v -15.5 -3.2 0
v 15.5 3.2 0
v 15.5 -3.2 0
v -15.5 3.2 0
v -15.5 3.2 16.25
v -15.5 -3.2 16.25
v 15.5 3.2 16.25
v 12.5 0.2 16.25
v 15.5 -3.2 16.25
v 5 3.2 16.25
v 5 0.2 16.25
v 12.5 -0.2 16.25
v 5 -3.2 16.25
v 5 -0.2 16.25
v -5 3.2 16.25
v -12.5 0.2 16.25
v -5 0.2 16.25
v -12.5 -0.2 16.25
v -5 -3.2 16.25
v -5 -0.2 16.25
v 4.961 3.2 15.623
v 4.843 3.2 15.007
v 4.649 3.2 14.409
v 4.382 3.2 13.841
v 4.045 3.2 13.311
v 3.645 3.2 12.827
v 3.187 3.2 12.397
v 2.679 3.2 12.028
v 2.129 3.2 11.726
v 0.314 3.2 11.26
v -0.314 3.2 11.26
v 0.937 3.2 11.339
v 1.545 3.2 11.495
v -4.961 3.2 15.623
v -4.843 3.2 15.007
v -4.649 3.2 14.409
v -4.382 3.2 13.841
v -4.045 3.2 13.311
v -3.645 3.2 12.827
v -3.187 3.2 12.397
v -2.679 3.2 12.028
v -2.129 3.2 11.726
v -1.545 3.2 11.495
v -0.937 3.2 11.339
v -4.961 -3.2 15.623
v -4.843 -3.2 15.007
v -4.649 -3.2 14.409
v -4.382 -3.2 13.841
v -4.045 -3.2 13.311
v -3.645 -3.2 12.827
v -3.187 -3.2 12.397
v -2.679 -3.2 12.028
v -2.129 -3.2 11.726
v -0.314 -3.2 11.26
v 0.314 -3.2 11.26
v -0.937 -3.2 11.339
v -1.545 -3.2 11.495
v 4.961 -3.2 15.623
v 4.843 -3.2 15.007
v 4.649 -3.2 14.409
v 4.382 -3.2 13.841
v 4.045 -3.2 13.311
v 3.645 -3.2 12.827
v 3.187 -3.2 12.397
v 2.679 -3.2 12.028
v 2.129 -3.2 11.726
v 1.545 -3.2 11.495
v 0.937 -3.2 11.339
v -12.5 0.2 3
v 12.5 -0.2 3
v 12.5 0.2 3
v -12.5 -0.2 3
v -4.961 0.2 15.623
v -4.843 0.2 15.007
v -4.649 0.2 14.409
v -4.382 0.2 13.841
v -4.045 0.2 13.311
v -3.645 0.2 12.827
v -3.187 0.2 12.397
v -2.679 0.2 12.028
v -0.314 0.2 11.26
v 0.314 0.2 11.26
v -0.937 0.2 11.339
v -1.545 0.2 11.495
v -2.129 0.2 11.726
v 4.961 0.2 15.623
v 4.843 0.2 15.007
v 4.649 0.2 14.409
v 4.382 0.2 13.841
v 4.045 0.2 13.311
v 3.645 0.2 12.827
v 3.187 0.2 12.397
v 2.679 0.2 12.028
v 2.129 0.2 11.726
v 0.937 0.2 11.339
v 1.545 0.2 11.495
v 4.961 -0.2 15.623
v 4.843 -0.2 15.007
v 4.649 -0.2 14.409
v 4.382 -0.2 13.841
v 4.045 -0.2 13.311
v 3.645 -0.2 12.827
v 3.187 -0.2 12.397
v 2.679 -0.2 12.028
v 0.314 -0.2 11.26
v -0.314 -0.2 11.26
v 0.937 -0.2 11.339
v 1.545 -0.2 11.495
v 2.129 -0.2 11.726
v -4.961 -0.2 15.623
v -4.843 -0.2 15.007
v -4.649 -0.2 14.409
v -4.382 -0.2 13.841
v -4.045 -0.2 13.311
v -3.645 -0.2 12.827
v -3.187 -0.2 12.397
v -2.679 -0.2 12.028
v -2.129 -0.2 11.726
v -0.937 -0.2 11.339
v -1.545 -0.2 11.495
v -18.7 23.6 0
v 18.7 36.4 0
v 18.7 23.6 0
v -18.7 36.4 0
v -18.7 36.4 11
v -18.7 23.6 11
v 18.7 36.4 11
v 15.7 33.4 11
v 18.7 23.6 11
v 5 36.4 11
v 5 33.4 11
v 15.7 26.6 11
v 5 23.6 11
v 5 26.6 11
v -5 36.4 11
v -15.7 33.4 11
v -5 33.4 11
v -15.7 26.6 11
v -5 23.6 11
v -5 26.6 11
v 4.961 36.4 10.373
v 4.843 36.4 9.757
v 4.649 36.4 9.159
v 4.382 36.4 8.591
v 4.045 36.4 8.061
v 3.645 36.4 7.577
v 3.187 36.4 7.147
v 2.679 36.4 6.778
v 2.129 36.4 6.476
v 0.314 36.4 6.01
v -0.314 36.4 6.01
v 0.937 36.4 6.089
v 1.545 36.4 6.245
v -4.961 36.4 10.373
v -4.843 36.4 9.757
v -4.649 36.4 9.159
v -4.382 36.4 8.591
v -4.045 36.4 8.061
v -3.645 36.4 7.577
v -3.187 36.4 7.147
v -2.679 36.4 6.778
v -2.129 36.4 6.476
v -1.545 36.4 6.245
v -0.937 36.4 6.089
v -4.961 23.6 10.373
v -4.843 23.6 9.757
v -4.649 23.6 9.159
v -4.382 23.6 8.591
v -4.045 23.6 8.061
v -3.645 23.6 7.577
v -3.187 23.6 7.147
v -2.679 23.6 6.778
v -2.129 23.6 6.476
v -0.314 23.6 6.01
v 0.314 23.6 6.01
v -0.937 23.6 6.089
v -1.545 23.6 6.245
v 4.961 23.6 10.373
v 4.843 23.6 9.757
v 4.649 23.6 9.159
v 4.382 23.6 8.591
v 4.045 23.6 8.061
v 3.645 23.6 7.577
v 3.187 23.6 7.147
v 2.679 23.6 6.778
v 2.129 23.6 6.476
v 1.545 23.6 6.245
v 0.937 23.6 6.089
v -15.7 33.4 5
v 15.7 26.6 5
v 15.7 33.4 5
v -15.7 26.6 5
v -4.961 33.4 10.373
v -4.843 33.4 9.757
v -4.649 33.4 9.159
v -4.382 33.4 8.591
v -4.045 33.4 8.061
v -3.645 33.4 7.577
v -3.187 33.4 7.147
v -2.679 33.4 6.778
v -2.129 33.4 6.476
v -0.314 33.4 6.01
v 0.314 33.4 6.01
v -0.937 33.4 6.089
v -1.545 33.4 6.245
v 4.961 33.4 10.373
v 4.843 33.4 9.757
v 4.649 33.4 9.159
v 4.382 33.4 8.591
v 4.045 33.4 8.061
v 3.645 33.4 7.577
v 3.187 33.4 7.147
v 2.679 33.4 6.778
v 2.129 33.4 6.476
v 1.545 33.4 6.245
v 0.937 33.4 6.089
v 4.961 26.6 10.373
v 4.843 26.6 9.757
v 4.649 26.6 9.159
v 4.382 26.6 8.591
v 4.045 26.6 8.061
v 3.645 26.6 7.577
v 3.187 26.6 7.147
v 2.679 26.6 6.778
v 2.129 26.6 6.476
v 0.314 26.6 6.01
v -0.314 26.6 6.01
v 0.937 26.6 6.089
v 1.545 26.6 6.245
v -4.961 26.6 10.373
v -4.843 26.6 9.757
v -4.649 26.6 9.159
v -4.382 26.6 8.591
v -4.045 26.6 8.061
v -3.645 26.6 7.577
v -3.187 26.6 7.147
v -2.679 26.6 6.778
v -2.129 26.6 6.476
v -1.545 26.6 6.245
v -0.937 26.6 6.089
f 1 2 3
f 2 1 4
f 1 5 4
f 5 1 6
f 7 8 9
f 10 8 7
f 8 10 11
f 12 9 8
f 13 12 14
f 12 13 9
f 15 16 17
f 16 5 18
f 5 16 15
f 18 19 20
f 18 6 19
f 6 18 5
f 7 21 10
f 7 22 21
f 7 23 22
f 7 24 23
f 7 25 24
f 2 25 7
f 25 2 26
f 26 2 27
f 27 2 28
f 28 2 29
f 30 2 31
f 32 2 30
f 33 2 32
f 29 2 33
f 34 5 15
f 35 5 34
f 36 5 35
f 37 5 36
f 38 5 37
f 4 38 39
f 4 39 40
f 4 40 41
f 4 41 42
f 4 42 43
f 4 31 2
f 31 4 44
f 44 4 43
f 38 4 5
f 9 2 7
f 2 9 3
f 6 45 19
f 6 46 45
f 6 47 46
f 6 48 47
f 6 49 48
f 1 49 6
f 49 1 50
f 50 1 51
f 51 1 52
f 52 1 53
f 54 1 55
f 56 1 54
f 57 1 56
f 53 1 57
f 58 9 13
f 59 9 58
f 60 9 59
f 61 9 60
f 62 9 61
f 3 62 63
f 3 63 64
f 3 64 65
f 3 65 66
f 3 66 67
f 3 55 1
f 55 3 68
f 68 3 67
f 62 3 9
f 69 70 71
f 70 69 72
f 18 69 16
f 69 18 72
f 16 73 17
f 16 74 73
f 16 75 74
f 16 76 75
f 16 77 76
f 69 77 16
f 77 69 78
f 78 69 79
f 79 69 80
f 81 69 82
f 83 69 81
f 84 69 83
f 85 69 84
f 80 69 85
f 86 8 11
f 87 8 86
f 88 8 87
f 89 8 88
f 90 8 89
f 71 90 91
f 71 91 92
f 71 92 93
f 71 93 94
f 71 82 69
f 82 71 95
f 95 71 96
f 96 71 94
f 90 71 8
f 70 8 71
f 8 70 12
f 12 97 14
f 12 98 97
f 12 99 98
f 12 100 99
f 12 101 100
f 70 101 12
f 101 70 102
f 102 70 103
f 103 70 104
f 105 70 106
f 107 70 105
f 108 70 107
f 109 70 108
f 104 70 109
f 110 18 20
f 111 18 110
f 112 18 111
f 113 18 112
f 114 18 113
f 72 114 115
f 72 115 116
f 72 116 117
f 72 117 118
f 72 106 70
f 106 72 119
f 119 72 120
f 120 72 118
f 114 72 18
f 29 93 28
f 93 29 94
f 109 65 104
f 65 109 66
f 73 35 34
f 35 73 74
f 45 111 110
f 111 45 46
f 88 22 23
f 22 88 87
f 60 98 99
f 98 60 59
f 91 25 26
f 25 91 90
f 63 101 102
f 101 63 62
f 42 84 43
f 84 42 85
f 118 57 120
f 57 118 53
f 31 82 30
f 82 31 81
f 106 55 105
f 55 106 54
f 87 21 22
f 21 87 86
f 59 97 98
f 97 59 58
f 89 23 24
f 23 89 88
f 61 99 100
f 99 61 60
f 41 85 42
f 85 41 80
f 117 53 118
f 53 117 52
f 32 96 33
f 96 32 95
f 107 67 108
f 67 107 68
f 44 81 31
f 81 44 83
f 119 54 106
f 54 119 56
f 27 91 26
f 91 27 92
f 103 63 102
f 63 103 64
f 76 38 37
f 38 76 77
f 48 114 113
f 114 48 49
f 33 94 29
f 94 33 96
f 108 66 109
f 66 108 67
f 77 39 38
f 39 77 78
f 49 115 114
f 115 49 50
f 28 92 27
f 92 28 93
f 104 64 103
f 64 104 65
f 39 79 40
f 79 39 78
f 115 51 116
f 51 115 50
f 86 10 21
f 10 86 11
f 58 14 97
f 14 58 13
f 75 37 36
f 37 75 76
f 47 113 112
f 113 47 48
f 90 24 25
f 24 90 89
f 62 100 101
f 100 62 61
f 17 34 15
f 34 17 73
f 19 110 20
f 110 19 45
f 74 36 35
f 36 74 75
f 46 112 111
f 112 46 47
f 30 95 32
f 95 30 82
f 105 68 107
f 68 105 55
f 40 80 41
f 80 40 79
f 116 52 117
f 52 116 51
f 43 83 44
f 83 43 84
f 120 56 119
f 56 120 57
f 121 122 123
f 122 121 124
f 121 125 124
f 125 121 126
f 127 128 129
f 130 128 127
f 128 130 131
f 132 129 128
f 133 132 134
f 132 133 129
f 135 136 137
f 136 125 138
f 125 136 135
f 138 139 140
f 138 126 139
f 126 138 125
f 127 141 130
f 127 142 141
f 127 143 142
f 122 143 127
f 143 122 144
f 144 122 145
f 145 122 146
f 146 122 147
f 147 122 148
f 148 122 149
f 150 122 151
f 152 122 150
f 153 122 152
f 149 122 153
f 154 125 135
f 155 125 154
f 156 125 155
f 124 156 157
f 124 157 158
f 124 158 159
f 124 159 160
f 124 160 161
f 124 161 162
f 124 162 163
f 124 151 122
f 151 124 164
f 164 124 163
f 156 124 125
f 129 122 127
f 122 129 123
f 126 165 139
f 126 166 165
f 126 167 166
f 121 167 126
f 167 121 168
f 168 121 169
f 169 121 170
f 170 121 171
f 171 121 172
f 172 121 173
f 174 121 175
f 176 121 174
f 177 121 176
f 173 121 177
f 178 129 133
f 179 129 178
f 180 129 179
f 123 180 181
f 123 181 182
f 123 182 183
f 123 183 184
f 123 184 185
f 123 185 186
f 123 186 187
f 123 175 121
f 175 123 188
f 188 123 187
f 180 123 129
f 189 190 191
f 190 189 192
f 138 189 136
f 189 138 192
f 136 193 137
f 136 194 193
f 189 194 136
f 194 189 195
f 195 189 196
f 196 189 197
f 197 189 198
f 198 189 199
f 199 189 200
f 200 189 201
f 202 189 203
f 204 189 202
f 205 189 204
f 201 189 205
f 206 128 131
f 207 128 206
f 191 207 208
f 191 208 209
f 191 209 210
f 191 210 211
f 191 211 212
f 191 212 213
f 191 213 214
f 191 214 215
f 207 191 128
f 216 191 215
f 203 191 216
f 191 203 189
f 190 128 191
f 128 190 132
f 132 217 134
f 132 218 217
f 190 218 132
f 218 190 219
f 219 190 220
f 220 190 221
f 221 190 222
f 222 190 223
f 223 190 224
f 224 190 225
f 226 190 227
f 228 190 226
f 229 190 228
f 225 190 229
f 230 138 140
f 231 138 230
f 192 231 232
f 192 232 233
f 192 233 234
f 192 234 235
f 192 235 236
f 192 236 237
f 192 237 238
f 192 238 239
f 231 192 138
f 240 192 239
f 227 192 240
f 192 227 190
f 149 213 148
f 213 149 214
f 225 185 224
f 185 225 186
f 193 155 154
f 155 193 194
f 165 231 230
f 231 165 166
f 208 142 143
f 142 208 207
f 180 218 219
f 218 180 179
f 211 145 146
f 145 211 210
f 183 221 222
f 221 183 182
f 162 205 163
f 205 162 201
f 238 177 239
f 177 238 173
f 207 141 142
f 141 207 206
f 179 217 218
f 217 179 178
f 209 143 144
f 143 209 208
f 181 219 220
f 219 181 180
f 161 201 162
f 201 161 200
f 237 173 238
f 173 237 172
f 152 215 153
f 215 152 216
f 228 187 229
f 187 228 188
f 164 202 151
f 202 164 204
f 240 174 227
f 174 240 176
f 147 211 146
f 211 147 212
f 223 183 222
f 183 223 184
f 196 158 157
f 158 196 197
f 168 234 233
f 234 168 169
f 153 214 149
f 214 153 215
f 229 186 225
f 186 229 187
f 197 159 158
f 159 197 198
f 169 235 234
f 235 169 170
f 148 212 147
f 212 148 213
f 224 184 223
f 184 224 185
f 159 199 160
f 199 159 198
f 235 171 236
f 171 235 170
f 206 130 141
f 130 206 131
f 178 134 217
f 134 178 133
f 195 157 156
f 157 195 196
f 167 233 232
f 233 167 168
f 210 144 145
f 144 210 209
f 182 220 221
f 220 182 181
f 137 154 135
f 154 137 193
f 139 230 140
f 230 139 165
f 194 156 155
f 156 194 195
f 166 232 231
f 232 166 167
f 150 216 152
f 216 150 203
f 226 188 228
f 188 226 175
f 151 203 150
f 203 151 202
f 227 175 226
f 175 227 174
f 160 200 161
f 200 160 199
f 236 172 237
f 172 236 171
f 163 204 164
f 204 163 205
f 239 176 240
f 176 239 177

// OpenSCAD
$fn = 50;

bladeThickness = 0.4;
bladeWidth = 9;

cutterWidth = 30;
wallThickness = 3;

bladeLength = 25;
cableRadius = 5;
cutDepth = 0.75;

cutterTopDepth = 3;

clearance = 0.2;

cutter();

module cutter()
{
    cutterBottom();
    translate([0, 30, 0])
    {
        cutterTop();
    }
}

module cutterBottom()
{
    difference()
    {
        linear_extrude(height = wallThickness + cableRadius + bladeWidth - cutDepth)
        {
            square([bladeLength + 2 * wallThickness, bladeThickness + 2 * wallThickness], center = true);
        }
        blade(bladeWidth + cableRadius - cutDepth + 0.1);
        translate([0, 0, wallThickness + bladeWidth - cutDepth + cableRadius])
        {
            rotate([90, 0, 0])
            {
                cylinder(r = cableRadius, h = 2 * wallThickness + bladeThickness + 0.2, center = true);
            }
        }
    }
//    color([1, 0, 0])
//    {
//        blade(bladeWidth);
//    }
}

module blade(width)
{
    translate([0, 0, wallThickness])
    {
        linear_extrude(height = width)
        {
            square([bladeLength, bladeThickness], center = true);
        }
    }
}

module cutterTop()
{
    difference()
    {
        linear_extrude(height = 2 * wallThickness + cableRadius)
        {
            square([bladeLength + 4 * wallThickness + 2 * clearance, 4 * wallThickness + bladeThickness + 2 * clearance], center = true);
        }
        translate([0, 0, wallThickness + cableRadius - cutterTopDepth])
        {
            linear_extrude(height = 2 * wallThickness + cableRadius)
            {
                square([bladeLength + 2 * wallThickness + 2 * clearance, 2 * wallThickness + bladeThickness + 2 * clearance], center = true);
            }
        }
        translate([0, 0, 2 * wallThickness + cableRadius])
        {
            rotate([90, 0, 0])
            {
                cylinder(r = cableRadius, h = 4 * wallThickness + 2 * clearance + bladeThickness + 0.2, center = true);
            }
        }
    }
}
